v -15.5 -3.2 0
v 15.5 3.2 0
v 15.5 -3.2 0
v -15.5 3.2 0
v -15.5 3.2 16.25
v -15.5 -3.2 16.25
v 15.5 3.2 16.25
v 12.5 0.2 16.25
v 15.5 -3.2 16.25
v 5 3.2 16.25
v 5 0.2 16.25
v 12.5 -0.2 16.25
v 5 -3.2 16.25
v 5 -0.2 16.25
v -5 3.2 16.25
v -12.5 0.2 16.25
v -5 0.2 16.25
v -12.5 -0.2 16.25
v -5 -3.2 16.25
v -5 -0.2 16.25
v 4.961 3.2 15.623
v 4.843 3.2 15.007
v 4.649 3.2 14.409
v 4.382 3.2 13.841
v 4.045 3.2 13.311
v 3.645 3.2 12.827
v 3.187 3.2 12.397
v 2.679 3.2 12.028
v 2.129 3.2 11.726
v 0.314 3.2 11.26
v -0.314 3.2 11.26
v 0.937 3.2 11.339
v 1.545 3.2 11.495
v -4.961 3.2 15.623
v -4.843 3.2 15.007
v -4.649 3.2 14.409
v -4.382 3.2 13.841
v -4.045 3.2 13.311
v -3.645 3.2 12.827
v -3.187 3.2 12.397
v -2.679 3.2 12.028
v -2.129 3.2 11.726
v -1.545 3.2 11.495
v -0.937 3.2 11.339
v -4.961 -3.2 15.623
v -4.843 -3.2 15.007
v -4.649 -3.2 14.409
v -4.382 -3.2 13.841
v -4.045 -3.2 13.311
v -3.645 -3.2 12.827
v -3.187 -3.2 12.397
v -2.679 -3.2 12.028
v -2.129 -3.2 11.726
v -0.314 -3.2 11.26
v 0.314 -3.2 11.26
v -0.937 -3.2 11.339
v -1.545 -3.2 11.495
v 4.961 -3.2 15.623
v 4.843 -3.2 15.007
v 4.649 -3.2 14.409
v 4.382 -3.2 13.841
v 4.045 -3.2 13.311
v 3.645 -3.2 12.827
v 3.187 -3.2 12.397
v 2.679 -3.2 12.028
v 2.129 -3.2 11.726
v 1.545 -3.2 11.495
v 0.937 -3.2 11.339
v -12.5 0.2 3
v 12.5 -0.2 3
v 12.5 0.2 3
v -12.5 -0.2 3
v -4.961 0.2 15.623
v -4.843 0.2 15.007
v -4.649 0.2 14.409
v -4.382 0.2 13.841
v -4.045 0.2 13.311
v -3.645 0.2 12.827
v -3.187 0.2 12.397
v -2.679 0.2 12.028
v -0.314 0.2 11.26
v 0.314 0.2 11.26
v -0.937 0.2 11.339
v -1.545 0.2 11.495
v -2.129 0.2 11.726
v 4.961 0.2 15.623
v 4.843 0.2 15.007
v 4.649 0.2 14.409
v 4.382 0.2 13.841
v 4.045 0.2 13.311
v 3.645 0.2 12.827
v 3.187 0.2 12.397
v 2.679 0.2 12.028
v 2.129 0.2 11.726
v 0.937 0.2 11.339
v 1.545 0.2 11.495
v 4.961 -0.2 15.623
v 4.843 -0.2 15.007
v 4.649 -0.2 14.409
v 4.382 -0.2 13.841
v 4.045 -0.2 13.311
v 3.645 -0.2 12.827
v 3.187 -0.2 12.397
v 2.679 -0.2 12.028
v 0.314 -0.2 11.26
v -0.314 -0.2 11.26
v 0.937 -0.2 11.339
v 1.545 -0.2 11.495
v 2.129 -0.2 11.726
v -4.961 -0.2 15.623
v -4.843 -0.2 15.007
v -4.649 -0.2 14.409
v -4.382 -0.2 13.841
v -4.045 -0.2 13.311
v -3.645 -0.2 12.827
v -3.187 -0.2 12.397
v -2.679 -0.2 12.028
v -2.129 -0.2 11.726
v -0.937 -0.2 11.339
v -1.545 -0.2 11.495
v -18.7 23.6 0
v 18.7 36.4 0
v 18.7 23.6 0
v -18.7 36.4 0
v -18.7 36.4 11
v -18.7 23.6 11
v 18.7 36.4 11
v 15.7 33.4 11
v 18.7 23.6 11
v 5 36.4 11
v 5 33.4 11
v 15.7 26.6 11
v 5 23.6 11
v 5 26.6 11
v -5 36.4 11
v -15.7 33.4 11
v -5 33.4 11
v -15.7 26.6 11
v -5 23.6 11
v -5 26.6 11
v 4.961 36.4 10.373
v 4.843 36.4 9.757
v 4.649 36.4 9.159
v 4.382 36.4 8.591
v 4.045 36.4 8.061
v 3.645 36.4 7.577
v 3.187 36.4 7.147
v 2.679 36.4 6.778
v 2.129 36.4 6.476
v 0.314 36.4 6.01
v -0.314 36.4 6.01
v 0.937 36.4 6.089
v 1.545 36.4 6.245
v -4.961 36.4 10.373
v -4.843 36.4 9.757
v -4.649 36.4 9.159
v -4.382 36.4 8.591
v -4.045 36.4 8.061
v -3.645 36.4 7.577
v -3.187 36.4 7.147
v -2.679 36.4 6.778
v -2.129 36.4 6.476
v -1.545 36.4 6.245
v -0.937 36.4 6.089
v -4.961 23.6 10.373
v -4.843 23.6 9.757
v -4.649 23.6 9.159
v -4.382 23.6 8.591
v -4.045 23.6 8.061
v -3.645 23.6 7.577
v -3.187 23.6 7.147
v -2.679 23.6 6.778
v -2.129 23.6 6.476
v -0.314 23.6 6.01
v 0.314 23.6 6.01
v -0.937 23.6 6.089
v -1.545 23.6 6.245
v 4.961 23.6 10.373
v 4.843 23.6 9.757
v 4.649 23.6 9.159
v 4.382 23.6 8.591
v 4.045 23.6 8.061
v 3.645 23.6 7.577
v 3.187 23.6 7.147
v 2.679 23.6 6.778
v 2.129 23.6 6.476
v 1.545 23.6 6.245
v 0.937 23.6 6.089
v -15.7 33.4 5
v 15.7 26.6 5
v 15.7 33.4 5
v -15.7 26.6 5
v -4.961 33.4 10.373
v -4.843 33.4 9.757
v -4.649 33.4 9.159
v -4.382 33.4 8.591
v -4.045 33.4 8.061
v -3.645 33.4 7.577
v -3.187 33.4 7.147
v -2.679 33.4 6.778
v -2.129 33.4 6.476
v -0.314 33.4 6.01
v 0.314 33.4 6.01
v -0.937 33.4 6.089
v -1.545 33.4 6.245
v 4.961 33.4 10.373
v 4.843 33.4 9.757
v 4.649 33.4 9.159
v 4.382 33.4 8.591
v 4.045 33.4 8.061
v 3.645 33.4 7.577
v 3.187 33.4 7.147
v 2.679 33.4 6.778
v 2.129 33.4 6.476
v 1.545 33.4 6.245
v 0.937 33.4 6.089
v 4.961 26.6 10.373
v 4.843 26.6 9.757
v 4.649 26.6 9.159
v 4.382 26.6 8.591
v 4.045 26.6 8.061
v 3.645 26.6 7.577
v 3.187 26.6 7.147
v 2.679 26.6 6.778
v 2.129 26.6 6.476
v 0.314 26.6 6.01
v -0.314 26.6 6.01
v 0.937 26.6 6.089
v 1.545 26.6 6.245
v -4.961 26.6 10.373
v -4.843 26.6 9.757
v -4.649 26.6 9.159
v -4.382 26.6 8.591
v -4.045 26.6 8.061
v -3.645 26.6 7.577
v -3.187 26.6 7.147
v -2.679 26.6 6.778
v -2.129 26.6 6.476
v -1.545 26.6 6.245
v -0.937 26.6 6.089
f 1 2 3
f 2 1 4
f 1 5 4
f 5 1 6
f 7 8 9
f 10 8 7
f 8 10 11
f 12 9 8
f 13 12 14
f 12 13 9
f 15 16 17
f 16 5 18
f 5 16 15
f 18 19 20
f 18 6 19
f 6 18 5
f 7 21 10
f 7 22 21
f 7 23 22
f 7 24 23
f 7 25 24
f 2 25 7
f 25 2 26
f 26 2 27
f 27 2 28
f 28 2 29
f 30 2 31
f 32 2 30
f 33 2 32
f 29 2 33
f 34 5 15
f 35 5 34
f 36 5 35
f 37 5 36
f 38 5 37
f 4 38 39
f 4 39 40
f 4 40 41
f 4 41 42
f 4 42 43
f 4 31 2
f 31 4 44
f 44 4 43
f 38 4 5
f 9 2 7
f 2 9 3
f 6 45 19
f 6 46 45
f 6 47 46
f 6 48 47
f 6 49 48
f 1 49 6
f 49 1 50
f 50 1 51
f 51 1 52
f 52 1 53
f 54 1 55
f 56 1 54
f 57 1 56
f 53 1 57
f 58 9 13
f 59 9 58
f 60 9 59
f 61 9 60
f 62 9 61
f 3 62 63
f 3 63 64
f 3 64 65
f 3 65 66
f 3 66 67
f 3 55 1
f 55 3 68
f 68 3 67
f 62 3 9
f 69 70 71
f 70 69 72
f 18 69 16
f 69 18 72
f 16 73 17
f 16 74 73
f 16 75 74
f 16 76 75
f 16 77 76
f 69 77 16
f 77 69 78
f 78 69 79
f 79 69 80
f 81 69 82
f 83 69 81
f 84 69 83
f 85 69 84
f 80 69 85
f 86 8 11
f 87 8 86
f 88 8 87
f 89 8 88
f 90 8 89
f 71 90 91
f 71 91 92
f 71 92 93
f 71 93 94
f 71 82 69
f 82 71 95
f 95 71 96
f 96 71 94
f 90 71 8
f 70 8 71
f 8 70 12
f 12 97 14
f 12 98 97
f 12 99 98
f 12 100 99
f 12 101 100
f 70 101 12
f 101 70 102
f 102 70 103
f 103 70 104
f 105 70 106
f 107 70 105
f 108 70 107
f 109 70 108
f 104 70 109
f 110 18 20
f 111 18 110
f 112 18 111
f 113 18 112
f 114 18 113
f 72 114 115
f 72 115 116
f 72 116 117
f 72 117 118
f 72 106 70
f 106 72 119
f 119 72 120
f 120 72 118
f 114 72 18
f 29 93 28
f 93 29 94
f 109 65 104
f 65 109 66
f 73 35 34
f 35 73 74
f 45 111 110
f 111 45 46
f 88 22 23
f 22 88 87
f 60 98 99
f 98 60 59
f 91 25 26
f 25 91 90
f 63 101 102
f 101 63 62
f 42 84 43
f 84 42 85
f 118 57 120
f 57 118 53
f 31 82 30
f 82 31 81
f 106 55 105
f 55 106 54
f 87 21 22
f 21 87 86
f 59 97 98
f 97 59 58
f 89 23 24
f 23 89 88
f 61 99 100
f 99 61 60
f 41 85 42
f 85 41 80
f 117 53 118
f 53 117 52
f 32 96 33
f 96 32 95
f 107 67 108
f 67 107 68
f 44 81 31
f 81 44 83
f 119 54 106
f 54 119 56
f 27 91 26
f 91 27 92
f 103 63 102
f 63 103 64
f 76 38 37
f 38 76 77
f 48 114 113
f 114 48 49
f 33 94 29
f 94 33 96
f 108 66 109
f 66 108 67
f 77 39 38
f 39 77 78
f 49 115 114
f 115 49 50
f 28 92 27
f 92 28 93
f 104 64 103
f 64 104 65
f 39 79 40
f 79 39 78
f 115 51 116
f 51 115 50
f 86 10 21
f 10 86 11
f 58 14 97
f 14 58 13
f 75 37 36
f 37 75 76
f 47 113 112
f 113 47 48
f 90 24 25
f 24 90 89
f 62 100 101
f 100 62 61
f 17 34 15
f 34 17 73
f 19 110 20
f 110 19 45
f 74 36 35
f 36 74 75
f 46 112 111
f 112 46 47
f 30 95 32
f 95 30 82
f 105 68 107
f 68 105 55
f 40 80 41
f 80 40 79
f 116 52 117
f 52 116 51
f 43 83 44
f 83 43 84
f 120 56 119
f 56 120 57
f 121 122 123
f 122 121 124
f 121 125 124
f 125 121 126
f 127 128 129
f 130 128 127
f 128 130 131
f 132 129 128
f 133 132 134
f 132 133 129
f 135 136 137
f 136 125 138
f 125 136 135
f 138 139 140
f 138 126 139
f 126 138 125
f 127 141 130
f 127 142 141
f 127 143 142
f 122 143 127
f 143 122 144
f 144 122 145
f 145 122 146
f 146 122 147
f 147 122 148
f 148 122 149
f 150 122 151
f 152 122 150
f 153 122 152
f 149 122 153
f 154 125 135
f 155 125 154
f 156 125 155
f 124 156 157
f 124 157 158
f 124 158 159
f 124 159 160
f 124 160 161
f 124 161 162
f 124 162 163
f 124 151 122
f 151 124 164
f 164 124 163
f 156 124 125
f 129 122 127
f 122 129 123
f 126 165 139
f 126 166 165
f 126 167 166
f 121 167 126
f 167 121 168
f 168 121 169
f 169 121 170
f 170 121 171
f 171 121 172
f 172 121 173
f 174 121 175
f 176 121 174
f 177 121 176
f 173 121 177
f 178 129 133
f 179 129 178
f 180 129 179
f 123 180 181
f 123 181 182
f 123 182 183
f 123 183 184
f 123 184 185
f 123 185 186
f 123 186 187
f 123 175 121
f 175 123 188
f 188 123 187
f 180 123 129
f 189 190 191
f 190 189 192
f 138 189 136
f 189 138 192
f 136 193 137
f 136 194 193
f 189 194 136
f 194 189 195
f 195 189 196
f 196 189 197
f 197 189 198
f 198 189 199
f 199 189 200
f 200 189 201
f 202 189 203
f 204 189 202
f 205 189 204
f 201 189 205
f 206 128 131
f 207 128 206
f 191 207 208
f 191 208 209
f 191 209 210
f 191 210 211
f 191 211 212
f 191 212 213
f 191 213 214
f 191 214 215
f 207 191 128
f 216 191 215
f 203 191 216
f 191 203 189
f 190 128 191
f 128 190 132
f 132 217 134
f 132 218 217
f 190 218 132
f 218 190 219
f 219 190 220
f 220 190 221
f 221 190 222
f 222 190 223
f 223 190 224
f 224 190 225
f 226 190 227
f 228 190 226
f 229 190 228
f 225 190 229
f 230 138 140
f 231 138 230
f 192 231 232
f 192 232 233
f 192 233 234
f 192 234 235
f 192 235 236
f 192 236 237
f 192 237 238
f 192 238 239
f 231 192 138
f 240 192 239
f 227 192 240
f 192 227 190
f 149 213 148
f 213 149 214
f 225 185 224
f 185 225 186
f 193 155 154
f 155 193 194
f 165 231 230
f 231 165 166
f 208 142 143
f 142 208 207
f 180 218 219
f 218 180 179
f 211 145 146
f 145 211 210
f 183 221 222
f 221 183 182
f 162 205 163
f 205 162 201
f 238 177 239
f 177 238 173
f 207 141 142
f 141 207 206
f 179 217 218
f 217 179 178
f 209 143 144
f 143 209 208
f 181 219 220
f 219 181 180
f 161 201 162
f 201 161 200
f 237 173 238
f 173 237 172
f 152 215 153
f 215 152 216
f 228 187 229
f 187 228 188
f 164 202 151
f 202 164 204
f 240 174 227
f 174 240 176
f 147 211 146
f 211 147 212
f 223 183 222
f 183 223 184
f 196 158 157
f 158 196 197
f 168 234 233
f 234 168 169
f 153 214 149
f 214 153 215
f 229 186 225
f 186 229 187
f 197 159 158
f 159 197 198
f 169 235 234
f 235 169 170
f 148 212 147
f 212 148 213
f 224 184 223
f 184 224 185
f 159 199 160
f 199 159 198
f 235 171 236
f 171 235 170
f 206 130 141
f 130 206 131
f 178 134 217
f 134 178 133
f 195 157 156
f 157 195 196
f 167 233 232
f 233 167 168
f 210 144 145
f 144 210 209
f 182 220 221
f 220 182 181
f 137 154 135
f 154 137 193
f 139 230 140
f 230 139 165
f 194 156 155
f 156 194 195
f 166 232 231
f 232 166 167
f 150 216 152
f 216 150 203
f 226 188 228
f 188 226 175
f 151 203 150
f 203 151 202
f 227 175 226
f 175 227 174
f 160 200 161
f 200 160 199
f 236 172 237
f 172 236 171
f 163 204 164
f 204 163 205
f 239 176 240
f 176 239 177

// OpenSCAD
$fn = 50;

bladeThickness = 0.4;
bladeWidth = 9;

cutterWidth = 30;
wallThickness = 3;

bladeLength = 25;
cableRadius = 5;
cutDepth = 0.75;

cutterTopDepth = 3;

clearance = 0.2;

cutter();

module cutter()
{
    cutterBottom();
    translate([0, 30, 0])
    {
        cutterTop();
    }
}

module cutterBottom()
{
    difference()
    {
        linear_extrude(height = wallThickness + cableRadius + bladeWidth - cutDepth)
        {
            square([bladeLength + 2 * wallThickness, bladeThickness + 2 * wallThickness], center = true);
        }
        blade(bladeWidth + cableRadius - cutDepth + 0.1);
        translate([0, 0, wallThickness + bladeWidth - cutDepth + cableRadius])
        {
            rotate([90, 0, 0])
            {
                cylinder(r = cableRadius, h = 2 * wallThickness + bladeThickness + 0.2, center = true);
            }
        }
    }
//    color([1, 0, 0])
//    {
//        blade(bladeWidth);
//    }
}

module blade(width)
{
    translate([0, 0, wallThickness])
    {
        linear_extrude(height = width)
        {
            square([bladeLength, bladeThickness], center = true);
        }
    }
}

module cutterTop()
{
    difference()
    {
        linear_extrude(height = 2 * wallThickness + cableRadius)
        {
            square([bladeLength + 4 * wallThickness + 2 * clearance, 4 * wallThickness + bladeThickness + 2 * clearance], center = true);
        }
        translate([0, 0, wallThickness + cableRadius - cutterTopDepth])
        {
            linear_extrude(height = 2 * wallThickness + cableRadius)
            {
                square([bladeLength + 2 * wallThickness + 2 * clearance, 2 * wallThickness + bladeThickness + 2 * clearance], center = true);
            }
        }
        translate([0, 0, 2 * wallThickness + cableRadius])
        {
            rotate([90, 0, 0])
            {
                cylinder(r = cableRadius, h = 4 * wallThickness + 2 * clearance + bladeThickness + 0.2, center = true);
            }
        }
    }
}
